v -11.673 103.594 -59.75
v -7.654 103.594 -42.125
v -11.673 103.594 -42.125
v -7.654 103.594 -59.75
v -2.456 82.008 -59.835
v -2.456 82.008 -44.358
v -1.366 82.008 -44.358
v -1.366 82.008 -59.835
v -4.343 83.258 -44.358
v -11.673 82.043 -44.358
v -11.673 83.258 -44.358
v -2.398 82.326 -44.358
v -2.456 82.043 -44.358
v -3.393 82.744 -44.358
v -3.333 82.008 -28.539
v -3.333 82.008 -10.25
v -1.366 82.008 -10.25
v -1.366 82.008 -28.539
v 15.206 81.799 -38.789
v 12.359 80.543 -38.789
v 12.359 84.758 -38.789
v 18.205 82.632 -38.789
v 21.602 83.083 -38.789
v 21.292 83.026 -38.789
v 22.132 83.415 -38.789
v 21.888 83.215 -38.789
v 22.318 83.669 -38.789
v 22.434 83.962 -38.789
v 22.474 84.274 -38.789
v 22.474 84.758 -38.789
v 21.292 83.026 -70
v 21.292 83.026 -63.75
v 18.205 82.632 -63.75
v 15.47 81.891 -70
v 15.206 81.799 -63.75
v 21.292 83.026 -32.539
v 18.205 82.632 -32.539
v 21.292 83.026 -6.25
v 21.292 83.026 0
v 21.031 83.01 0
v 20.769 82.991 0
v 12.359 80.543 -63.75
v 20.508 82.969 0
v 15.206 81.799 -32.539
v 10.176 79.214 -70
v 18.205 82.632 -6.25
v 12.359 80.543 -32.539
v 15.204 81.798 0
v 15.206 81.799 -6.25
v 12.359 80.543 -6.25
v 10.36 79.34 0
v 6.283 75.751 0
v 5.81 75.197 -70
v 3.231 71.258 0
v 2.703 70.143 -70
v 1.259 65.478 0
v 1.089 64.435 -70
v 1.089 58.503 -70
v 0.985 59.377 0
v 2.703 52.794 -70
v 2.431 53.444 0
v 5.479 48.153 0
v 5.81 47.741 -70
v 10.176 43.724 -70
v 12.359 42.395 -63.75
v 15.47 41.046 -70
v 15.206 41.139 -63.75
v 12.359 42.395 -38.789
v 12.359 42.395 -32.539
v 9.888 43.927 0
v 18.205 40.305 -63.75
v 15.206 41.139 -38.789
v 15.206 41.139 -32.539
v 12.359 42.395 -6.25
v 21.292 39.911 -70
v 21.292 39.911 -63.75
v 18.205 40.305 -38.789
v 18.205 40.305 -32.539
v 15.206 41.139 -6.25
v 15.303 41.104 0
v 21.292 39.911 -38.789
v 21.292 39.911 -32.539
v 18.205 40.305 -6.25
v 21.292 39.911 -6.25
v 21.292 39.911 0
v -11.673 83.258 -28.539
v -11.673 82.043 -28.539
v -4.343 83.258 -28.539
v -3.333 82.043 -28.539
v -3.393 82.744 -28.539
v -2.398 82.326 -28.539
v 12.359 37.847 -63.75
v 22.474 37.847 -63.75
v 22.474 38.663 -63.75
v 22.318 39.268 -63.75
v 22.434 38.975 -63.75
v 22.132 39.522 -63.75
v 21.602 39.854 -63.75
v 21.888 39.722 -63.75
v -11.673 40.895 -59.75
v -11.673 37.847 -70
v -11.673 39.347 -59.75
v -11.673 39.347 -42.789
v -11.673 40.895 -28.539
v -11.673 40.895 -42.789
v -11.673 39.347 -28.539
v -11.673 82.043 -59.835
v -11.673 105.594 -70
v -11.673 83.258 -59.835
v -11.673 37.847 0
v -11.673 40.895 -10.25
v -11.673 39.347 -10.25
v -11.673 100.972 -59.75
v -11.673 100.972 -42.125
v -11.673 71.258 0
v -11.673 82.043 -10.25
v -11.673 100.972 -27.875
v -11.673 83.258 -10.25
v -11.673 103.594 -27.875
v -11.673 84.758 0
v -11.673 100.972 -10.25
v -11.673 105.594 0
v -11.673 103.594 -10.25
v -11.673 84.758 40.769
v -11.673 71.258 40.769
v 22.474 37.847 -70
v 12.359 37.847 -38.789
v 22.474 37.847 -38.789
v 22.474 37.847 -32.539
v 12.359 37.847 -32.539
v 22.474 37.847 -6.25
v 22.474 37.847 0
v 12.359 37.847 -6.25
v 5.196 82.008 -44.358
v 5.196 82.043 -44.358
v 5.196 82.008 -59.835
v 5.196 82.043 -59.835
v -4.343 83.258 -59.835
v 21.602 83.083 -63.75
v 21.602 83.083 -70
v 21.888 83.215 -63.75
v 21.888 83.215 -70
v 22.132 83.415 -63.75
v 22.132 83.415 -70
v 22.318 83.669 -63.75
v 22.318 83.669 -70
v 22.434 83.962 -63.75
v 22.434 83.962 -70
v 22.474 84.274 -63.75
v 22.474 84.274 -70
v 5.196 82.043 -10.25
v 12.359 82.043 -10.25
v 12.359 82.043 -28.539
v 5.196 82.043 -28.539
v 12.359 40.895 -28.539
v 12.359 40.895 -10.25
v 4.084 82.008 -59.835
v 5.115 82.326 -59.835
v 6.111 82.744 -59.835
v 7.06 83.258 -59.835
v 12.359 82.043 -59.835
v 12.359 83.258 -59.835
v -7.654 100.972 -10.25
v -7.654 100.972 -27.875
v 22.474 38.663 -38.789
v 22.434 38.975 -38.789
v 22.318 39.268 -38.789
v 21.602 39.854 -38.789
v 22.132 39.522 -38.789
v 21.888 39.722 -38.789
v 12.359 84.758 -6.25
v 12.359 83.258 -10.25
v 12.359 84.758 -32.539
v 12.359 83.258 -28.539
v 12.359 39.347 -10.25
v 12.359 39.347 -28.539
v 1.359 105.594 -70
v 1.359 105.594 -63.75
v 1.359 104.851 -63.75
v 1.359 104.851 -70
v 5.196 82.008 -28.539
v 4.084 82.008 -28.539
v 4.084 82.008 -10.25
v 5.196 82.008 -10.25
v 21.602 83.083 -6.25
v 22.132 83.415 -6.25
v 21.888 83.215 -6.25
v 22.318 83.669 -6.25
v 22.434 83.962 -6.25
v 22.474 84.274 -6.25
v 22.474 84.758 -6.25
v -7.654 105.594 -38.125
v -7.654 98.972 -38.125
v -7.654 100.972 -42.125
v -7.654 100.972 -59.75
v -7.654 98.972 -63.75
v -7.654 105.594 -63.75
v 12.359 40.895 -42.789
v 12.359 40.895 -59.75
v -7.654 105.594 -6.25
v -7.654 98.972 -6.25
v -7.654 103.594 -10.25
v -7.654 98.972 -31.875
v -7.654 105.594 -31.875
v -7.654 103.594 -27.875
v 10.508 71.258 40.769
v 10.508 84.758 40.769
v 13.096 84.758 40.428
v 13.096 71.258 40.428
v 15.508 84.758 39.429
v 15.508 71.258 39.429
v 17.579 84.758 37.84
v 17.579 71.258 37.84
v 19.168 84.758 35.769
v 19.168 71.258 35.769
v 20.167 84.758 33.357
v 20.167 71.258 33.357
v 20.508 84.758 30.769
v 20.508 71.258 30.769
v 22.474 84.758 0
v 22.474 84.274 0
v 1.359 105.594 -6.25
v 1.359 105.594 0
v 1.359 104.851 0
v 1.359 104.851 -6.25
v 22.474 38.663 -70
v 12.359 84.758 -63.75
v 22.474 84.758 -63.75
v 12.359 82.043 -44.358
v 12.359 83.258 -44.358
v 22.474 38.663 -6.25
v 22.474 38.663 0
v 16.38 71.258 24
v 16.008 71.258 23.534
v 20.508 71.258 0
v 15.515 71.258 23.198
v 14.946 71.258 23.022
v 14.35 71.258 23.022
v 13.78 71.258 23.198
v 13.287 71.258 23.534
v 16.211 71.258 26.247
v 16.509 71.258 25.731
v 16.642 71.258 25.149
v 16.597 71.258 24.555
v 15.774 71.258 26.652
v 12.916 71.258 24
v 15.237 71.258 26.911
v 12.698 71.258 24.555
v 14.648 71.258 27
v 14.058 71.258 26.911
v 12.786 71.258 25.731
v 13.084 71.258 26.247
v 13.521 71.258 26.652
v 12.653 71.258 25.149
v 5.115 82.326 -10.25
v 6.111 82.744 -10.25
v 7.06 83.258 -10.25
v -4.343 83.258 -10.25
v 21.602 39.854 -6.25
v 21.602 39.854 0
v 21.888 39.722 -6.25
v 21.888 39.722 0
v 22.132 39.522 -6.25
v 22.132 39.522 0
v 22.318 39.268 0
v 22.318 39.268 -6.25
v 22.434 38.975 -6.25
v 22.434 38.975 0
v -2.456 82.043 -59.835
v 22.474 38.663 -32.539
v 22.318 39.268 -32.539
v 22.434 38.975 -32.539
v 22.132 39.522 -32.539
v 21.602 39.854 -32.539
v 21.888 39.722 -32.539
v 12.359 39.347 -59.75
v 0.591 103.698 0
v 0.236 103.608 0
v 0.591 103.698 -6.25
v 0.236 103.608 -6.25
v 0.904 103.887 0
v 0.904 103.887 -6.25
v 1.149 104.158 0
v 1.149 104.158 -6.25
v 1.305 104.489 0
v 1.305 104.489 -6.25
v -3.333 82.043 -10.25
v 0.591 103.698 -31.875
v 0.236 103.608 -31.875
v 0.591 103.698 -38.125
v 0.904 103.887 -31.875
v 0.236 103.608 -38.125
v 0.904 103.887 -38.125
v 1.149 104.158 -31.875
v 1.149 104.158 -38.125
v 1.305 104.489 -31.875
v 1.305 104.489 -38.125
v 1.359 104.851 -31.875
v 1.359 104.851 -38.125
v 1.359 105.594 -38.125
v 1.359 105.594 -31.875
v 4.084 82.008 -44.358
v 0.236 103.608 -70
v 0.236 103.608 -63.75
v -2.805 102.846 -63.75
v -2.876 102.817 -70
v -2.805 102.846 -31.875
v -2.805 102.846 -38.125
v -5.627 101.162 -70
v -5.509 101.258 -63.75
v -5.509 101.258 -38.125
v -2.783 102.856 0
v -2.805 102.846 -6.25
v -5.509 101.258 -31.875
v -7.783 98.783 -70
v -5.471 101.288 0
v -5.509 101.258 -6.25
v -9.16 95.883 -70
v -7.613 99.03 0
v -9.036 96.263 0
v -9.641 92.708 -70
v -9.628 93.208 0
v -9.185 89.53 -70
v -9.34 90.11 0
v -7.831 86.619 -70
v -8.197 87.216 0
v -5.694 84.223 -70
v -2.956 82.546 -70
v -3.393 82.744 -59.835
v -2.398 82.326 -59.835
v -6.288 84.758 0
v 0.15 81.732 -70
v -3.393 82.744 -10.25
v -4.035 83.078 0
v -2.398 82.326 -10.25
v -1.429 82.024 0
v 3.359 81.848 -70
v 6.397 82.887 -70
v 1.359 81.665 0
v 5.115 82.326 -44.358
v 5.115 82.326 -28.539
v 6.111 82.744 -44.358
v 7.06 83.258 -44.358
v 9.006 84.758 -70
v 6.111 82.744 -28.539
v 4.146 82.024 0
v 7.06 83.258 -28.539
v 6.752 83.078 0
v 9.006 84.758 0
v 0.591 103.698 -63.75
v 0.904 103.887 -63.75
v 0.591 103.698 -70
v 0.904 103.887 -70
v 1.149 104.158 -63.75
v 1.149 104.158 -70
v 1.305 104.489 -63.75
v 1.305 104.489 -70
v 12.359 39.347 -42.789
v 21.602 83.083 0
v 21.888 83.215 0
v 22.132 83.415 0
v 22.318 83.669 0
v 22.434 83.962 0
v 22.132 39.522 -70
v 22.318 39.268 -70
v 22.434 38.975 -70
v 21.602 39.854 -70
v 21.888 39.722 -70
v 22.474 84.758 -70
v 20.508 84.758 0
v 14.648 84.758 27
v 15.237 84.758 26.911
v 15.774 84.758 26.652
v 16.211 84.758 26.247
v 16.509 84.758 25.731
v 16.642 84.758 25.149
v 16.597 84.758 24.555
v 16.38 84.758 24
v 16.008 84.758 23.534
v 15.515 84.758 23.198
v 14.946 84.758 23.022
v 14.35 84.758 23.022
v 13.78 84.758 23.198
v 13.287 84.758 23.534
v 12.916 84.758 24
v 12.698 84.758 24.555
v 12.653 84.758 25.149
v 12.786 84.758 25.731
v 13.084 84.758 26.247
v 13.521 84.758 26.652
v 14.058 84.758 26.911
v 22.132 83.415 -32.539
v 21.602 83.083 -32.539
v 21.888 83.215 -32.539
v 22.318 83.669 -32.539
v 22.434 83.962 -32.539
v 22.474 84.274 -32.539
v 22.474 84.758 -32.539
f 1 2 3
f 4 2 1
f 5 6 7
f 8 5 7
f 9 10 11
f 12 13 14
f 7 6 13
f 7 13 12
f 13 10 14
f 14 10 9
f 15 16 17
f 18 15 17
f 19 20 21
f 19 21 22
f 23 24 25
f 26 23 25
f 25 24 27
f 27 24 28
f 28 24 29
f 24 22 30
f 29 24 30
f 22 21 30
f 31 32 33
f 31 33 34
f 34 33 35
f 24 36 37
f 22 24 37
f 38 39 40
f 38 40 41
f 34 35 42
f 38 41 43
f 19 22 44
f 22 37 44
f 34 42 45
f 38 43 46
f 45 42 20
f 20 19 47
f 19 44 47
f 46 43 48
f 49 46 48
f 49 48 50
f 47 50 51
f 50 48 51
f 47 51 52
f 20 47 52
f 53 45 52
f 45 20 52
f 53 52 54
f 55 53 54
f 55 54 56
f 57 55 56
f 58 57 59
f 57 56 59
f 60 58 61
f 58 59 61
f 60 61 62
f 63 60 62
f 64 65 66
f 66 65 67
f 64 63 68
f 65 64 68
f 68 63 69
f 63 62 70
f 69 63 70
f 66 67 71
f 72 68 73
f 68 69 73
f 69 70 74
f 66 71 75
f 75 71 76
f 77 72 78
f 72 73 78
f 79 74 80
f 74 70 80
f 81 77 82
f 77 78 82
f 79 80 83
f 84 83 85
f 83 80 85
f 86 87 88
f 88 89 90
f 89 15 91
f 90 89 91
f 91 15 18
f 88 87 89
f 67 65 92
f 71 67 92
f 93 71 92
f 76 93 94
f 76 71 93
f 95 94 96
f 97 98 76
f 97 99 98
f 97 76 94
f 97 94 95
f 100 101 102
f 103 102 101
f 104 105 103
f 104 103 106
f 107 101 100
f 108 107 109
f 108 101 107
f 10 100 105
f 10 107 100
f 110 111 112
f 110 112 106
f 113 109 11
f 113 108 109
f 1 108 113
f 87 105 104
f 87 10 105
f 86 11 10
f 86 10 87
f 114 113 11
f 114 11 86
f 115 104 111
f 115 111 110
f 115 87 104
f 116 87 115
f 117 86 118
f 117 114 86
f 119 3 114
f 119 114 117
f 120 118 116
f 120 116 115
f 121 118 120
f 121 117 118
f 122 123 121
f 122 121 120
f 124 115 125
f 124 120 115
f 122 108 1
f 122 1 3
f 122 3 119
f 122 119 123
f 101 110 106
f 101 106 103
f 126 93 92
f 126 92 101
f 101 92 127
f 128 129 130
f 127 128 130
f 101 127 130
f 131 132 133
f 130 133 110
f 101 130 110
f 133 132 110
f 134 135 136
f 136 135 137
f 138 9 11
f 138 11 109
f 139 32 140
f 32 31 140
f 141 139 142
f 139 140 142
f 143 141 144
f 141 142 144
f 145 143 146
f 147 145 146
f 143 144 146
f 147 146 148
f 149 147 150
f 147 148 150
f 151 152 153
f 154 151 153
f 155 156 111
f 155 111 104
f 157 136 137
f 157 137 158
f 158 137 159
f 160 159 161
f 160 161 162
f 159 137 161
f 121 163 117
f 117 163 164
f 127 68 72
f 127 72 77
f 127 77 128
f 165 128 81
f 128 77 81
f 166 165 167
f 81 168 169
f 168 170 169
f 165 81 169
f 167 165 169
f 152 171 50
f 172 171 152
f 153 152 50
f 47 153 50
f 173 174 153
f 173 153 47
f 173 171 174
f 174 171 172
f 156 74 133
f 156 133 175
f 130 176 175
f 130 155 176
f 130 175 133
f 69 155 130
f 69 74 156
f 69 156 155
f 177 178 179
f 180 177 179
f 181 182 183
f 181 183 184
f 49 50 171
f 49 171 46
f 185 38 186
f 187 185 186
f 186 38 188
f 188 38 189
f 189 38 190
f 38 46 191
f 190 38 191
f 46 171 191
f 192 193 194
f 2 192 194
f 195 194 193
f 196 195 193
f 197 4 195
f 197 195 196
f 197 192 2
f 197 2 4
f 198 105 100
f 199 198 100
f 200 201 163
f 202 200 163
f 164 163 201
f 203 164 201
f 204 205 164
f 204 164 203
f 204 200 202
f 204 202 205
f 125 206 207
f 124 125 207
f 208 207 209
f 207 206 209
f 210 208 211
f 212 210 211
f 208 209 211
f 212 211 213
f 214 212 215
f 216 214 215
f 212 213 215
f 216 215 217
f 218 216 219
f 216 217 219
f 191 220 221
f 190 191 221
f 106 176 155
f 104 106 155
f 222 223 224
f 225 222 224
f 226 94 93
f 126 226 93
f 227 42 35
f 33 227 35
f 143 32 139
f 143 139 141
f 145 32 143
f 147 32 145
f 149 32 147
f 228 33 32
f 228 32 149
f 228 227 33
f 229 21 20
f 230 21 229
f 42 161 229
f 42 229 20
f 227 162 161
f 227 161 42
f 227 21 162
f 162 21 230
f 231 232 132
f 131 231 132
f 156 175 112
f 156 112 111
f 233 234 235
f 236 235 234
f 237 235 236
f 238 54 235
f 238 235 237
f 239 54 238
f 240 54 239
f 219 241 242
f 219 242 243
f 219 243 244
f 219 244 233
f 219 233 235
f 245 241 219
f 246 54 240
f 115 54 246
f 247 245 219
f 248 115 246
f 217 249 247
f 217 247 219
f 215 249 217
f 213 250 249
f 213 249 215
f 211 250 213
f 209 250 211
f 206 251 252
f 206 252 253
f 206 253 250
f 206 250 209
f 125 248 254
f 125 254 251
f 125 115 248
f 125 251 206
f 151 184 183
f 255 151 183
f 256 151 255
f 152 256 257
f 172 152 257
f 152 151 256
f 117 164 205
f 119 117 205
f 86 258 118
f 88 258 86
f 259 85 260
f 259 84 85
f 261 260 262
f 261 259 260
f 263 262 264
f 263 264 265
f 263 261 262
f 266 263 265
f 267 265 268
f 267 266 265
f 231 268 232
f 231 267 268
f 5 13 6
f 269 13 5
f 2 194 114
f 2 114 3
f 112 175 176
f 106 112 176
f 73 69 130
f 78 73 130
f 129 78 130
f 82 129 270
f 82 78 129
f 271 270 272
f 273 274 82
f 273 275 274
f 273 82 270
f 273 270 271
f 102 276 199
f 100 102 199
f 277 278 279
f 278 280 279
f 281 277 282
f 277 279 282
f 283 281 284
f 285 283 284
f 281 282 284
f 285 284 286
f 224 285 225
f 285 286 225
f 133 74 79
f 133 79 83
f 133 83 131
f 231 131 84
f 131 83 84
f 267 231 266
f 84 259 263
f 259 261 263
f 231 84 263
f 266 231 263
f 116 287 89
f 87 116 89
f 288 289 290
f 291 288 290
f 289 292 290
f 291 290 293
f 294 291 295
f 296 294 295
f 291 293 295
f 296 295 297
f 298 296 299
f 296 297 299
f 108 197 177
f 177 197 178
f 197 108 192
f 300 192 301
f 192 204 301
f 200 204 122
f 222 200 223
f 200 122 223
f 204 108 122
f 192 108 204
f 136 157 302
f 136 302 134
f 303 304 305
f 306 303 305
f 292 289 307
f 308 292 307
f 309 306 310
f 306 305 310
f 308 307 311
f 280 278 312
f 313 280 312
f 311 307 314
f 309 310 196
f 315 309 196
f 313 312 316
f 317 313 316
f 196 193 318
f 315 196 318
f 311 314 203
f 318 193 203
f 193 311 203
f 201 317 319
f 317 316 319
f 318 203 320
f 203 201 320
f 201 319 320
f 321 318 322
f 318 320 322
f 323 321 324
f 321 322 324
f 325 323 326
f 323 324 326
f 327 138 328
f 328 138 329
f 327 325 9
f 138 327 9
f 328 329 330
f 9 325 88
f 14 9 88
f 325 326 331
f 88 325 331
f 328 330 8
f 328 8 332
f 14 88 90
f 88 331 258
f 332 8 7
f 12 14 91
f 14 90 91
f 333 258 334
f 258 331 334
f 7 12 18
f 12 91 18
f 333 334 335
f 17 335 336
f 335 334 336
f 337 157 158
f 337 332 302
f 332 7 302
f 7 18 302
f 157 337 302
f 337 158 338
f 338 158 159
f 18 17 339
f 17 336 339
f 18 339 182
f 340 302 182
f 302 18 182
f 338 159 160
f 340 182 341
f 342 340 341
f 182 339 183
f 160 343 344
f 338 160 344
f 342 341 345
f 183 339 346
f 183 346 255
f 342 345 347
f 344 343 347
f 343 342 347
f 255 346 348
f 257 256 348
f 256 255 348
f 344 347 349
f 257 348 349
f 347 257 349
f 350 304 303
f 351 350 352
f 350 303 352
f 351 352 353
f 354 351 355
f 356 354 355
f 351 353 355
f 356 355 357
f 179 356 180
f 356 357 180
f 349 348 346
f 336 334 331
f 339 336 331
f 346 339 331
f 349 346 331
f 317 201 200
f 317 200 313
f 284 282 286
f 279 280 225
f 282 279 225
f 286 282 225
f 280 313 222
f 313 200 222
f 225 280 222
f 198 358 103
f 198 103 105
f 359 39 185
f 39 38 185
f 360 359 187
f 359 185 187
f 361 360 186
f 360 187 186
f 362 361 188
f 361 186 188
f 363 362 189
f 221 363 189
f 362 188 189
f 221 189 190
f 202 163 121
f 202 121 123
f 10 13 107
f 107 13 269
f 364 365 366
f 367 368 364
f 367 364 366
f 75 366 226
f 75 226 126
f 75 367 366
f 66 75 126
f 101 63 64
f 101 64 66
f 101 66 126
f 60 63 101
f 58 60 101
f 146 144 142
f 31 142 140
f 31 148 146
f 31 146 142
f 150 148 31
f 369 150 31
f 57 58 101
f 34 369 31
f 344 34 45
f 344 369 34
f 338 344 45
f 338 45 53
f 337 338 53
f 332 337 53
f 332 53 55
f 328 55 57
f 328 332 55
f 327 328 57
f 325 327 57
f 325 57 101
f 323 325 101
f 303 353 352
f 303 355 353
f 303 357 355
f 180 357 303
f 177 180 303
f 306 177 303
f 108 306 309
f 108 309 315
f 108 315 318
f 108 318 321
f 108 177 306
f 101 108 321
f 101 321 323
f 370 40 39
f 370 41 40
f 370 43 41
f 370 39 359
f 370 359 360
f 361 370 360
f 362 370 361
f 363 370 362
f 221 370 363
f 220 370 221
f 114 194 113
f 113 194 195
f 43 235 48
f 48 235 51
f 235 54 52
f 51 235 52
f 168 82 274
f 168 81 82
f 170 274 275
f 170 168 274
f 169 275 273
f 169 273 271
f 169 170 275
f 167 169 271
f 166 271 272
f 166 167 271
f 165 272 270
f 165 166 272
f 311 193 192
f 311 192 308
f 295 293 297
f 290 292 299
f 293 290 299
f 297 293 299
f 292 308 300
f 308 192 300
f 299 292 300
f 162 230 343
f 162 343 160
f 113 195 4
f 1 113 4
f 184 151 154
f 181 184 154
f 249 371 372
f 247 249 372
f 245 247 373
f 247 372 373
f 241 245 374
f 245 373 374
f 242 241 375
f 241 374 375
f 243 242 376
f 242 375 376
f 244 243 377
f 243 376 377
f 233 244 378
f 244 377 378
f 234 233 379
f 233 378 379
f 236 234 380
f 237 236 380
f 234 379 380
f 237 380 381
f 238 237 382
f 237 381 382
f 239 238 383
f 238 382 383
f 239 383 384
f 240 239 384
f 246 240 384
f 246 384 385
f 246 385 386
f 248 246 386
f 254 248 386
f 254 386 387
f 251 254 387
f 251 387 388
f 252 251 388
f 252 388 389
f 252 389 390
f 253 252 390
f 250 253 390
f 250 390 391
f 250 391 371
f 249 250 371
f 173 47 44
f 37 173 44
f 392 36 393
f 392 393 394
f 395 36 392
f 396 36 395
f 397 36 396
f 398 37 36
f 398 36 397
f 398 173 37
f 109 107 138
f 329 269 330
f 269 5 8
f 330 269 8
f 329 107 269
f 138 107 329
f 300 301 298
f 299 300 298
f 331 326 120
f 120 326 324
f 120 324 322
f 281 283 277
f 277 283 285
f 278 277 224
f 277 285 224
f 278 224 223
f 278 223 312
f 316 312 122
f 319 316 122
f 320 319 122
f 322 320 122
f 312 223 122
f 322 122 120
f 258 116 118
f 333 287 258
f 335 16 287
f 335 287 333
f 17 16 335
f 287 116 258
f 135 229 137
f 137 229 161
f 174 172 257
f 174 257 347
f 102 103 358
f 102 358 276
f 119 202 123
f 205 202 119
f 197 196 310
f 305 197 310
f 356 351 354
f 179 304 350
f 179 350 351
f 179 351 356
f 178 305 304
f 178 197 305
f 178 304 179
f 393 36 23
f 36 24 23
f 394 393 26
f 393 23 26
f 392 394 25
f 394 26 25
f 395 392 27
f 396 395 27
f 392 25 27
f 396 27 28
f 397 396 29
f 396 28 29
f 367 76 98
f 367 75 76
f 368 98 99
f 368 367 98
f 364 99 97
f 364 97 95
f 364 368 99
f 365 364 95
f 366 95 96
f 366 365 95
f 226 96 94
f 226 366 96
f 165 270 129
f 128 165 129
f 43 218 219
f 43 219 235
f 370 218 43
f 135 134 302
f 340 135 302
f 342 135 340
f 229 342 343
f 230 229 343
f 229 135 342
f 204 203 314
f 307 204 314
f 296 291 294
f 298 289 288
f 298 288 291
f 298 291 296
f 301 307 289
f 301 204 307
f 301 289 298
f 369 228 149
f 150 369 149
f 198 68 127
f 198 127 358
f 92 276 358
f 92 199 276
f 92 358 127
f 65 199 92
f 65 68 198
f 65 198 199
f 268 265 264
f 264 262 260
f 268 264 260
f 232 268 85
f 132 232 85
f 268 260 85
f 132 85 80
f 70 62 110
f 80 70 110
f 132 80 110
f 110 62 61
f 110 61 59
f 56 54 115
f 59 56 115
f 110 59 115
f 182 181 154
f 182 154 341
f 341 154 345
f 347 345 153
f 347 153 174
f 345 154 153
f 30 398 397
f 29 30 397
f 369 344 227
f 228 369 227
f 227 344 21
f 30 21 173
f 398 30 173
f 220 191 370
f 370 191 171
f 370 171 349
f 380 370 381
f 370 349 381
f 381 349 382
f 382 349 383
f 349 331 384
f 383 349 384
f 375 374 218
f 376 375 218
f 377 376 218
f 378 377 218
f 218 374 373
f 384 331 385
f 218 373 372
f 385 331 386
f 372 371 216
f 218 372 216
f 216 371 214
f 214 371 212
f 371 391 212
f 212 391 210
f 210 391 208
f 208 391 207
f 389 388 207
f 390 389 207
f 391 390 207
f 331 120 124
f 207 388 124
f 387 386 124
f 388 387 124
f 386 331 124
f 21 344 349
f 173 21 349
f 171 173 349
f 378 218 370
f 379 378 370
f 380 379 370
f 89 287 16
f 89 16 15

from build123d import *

# Parameters (mm, degrees)
BOSS_EXTRUDE1_DEPTH = 70
SKETCH2_W           = 30.127897987
SKETCH2_H           = 25.625
CUT_EXTRUDE1_DEPTH  = 10
SKETCH3_W           = 36.135462637
SKETCH3_H           = 24.960917338
SKETCH3_H_2         = 26.289082662
CUT_EXTRUDE2_DEPTH  = 88.210896549
SKETCH5_W           = 40.769231001
SKETCH5_H           = 13.5
BOSS_EXTRUDE2_DEPTH = 50
SKETCH6_R           = 2
CUT_EXTRUDE3_DEPTH  = 50
FILLET1_R           = 1.25
FILLET2_R           = 16
SKETCH7_W           = 19.805527333
SKETCH7_H           = 40.769231001
CUT_EXTRUDE4_DEPTH  = 93.57213387
FILLET3_R           = 10
SKETCH9_W           = 15.47666937
SKETCH9_H           = 1.215437552
SKETCH9_W_2         = 18.289082662
SKETCH9_W_3         = 17.625
SKETCH9_H_2         = 2.622507707
SKETCH9_W_4         = 16.960917338
SKETCH9_H_3         = 1.548156683
CUT_EXTRUDE5_DEPTH  = 129.948187004
SKETCH10_W          = 7.652135561
SKETCH10_H          = 15.47666937
SKETCH10_W_2        = 8.528334289
SKETCH10_H_2        = 18.289082662
CUT_EXTRUDE8_DEPTH  = 2.75


with BuildPart() as part:
    # Sketch1 → Boss-Extrude1 (new body)
    with BuildSketch(Plane.XY):
        with BuildLine():
            Line((22.473811518, 84.75800041), (22.473811518, 83.058719541))
            ThreePointArc((22.473811518, 83.058719541), (0.883811518, 61.468719541), (22.473811518, 39.878719541))
            Line((22.473811518, 39.878719541), (22.473811518, 37.846719541))
            Line((22.473811518, 37.846719541), (-11.673355367, 37.846719541))
            Line((-11.673355367, 37.846719541), (-11.673355367, 105.594024014))
            Line((-11.673355367, 105.594024014), (1.358644633, 105.594024014))
            Line((1.358644633, 105.594024014), (1.358644633, 103.665116534))
            ThreePointArc((1.358644633, 103.665116534), (-8.83886186, 88.540693991), (9.005703845, 84.75800041))
            Line((9.005703845, 84.75800041), (22.473811518, 84.75800041))
        make_face()
    extrude(amount=-BOSS_EXTRUDE1_DEPTH)

    # Sketch2 → Cut-Extrude1 (cut)
    with BuildSketch(Plane(origin=(0, 105.594024014, 0), x_dir=(1, 0, 0), z_dir=(0, 1, 0))):
        with Locations((7.409862525, 50.9375)):
            Rectangle(SKETCH2_W, SKETCH2_H)
        with Locations((7.409862525, 19.0625)):
            Rectangle(SKETCH2_W, SKETCH2_H)
    extrude(amount=-CUT_EXTRUDE1_DEPTH, mode=Mode.SUBTRACT)

    # Sketch3 → Cut-Extrude2 (cut, through all)
    with BuildSketch(Plane(origin=(0, 84.75800041, 0), x_dir=(1, 0, 0), z_dir=(0, 1, 0))):
        with Locations((30.426375951, 51.269541331)):
            Rectangle(SKETCH3_W, SKETCH3_H)
        with Locations((30.426375951, 19.394541331)):
            Rectangle(SKETCH3_W, SKETCH3_H_2)
    extrude(amount=-CUT_EXTRUDE2_DEPTH, mode=Mode.SUBTRACT)

    # Sketch5 → Boss-Extrude2 (add)
    with BuildSketch(Plane.ZY.offset(11.673355367)):
        with Locations((20.384615501, 78.00800041)):
            Rectangle(SKETCH5_W, SKETCH5_H)
    extrude(amount=-BOSS_EXTRUDE2_DEPTH)

    # Sketch6 → Cut-Extrude3 (cut)
    with BuildSketch(Plane(origin=(0, 84.75800041, 0), x_dir=(1, 0, 0), z_dir=(0, 1, 0))):
        with Locations(Location((14.647627353, -25, 0), (0, 0, 270))):
            Circle(SKETCH6_R)
        with Locations(Location((30.329421103, -25, 0), (0, 0, 270))):
            Circle(SKETCH6_R)
    extrude(amount=-CUT_EXTRUDE3_DEPTH, mode=Mode.SUBTRACT)

    # Fillet1
    fillet1_edges = [part.edges().sort_by_distance(p)[0] for p in [
        (1.358644633, 103.665116534, -66.875),
        (22.473811518, 83.058719541, -66.875),
        (22.473811518, 39.878719541, -66.875),
        (1.358644633, 103.665116534, -35),
        (1.358644633, 103.665116534, -3.125),
        (22.473811518, 39.878719541, -35.664082662),
        (22.473811518, 39.878719541, -3.125),
        (22.473811518, 83.058719541, -35.664082662),
        (22.473811518, 83.058719541, -3.125),
    ]]
    fillet(fillet1_edges, radius=FILLET1_R)

    # Fillet2
    fillet2_edges = [part.edges().sort_by_distance(p)[0] for p in [
        (38.326644633, 78.00800041, 0),
        (38.326644633, 78.00800041, 40.769231001),
    ]]
    fillet(fillet2_edges, radius=FILLET2_R)

    # Sketch7 → Cut-Extrude4 (cut, through all)
    with BuildSketch(Plane(origin=(0, 84.75800041, 0), x_dir=(1, 0, 0), z_dir=(0, 1, 0))):
        with Locations((30.410801799, -20.384615501)):
            Rectangle(SKETCH7_W, SKETCH7_H)
    extrude(amount=-CUT_EXTRUDE4_DEPTH, mode=Mode.SUBTRACT)

    # Fillet3
    fillet3_edges = [part.edges().sort_by_distance(p)[0] for p in [
        (20.508038132, 78.00800041, 40.769231001),
    ]]
    fillet(fillet3_edges, radius=FILLET3_R)

    # Sketch9 → Cut-Extrude5 (cut, through all)
    with BuildSketch(Plane(origin=(12.358644633, 0, 0), x_dir=(0, 0, -1), z_dir=(1, 0, 0))):
        with Locations((52.096633222, 82.650281634)):
            Rectangle(SKETCH9_W, SKETCH9_H)
        with Locations((19.394541331, 82.650281634)):
            Rectangle(SKETCH9_W_2, SKETCH9_H)
        with Locations((50.9375, 102.282770161)):
            Rectangle(SKETCH9_W_3, SKETCH9_H_2)
        with Locations((19.0625, 102.282770161)):
            Rectangle(SKETCH9_W_3, SKETCH9_H_2)
        with Locations((51.269541331, 40.120797882)):
            Rectangle(SKETCH9_W_4, SKETCH9_H_3)
        with Locations((19.394541331, 40.120797882)):
            Rectangle(SKETCH9_W_2, SKETCH9_H_3)
    extrude(amount=-CUT_EXTRUDE5_DEPTH, mode=Mode.SUBTRACT)

    # Sketch10 → Cut-Extrude8 (cut)
    with BuildSketch(Plane(origin=(0, 84.75800041, 0), x_dir=(1, 0, 0), z_dir=(0, 1, 0))):
        with Locations((1.369713925, 52.096633222)):
            Rectangle(SKETCH10_W, SKETCH10_H)
        with Locations((0.931614561, 19.394541331)):
            Rectangle(SKETCH10_W_2, SKETCH10_H_2)
    extrude(amount=-CUT_EXTRUDE8_DEPTH, mode=Mode.SUBTRACT)


solid = part.part
